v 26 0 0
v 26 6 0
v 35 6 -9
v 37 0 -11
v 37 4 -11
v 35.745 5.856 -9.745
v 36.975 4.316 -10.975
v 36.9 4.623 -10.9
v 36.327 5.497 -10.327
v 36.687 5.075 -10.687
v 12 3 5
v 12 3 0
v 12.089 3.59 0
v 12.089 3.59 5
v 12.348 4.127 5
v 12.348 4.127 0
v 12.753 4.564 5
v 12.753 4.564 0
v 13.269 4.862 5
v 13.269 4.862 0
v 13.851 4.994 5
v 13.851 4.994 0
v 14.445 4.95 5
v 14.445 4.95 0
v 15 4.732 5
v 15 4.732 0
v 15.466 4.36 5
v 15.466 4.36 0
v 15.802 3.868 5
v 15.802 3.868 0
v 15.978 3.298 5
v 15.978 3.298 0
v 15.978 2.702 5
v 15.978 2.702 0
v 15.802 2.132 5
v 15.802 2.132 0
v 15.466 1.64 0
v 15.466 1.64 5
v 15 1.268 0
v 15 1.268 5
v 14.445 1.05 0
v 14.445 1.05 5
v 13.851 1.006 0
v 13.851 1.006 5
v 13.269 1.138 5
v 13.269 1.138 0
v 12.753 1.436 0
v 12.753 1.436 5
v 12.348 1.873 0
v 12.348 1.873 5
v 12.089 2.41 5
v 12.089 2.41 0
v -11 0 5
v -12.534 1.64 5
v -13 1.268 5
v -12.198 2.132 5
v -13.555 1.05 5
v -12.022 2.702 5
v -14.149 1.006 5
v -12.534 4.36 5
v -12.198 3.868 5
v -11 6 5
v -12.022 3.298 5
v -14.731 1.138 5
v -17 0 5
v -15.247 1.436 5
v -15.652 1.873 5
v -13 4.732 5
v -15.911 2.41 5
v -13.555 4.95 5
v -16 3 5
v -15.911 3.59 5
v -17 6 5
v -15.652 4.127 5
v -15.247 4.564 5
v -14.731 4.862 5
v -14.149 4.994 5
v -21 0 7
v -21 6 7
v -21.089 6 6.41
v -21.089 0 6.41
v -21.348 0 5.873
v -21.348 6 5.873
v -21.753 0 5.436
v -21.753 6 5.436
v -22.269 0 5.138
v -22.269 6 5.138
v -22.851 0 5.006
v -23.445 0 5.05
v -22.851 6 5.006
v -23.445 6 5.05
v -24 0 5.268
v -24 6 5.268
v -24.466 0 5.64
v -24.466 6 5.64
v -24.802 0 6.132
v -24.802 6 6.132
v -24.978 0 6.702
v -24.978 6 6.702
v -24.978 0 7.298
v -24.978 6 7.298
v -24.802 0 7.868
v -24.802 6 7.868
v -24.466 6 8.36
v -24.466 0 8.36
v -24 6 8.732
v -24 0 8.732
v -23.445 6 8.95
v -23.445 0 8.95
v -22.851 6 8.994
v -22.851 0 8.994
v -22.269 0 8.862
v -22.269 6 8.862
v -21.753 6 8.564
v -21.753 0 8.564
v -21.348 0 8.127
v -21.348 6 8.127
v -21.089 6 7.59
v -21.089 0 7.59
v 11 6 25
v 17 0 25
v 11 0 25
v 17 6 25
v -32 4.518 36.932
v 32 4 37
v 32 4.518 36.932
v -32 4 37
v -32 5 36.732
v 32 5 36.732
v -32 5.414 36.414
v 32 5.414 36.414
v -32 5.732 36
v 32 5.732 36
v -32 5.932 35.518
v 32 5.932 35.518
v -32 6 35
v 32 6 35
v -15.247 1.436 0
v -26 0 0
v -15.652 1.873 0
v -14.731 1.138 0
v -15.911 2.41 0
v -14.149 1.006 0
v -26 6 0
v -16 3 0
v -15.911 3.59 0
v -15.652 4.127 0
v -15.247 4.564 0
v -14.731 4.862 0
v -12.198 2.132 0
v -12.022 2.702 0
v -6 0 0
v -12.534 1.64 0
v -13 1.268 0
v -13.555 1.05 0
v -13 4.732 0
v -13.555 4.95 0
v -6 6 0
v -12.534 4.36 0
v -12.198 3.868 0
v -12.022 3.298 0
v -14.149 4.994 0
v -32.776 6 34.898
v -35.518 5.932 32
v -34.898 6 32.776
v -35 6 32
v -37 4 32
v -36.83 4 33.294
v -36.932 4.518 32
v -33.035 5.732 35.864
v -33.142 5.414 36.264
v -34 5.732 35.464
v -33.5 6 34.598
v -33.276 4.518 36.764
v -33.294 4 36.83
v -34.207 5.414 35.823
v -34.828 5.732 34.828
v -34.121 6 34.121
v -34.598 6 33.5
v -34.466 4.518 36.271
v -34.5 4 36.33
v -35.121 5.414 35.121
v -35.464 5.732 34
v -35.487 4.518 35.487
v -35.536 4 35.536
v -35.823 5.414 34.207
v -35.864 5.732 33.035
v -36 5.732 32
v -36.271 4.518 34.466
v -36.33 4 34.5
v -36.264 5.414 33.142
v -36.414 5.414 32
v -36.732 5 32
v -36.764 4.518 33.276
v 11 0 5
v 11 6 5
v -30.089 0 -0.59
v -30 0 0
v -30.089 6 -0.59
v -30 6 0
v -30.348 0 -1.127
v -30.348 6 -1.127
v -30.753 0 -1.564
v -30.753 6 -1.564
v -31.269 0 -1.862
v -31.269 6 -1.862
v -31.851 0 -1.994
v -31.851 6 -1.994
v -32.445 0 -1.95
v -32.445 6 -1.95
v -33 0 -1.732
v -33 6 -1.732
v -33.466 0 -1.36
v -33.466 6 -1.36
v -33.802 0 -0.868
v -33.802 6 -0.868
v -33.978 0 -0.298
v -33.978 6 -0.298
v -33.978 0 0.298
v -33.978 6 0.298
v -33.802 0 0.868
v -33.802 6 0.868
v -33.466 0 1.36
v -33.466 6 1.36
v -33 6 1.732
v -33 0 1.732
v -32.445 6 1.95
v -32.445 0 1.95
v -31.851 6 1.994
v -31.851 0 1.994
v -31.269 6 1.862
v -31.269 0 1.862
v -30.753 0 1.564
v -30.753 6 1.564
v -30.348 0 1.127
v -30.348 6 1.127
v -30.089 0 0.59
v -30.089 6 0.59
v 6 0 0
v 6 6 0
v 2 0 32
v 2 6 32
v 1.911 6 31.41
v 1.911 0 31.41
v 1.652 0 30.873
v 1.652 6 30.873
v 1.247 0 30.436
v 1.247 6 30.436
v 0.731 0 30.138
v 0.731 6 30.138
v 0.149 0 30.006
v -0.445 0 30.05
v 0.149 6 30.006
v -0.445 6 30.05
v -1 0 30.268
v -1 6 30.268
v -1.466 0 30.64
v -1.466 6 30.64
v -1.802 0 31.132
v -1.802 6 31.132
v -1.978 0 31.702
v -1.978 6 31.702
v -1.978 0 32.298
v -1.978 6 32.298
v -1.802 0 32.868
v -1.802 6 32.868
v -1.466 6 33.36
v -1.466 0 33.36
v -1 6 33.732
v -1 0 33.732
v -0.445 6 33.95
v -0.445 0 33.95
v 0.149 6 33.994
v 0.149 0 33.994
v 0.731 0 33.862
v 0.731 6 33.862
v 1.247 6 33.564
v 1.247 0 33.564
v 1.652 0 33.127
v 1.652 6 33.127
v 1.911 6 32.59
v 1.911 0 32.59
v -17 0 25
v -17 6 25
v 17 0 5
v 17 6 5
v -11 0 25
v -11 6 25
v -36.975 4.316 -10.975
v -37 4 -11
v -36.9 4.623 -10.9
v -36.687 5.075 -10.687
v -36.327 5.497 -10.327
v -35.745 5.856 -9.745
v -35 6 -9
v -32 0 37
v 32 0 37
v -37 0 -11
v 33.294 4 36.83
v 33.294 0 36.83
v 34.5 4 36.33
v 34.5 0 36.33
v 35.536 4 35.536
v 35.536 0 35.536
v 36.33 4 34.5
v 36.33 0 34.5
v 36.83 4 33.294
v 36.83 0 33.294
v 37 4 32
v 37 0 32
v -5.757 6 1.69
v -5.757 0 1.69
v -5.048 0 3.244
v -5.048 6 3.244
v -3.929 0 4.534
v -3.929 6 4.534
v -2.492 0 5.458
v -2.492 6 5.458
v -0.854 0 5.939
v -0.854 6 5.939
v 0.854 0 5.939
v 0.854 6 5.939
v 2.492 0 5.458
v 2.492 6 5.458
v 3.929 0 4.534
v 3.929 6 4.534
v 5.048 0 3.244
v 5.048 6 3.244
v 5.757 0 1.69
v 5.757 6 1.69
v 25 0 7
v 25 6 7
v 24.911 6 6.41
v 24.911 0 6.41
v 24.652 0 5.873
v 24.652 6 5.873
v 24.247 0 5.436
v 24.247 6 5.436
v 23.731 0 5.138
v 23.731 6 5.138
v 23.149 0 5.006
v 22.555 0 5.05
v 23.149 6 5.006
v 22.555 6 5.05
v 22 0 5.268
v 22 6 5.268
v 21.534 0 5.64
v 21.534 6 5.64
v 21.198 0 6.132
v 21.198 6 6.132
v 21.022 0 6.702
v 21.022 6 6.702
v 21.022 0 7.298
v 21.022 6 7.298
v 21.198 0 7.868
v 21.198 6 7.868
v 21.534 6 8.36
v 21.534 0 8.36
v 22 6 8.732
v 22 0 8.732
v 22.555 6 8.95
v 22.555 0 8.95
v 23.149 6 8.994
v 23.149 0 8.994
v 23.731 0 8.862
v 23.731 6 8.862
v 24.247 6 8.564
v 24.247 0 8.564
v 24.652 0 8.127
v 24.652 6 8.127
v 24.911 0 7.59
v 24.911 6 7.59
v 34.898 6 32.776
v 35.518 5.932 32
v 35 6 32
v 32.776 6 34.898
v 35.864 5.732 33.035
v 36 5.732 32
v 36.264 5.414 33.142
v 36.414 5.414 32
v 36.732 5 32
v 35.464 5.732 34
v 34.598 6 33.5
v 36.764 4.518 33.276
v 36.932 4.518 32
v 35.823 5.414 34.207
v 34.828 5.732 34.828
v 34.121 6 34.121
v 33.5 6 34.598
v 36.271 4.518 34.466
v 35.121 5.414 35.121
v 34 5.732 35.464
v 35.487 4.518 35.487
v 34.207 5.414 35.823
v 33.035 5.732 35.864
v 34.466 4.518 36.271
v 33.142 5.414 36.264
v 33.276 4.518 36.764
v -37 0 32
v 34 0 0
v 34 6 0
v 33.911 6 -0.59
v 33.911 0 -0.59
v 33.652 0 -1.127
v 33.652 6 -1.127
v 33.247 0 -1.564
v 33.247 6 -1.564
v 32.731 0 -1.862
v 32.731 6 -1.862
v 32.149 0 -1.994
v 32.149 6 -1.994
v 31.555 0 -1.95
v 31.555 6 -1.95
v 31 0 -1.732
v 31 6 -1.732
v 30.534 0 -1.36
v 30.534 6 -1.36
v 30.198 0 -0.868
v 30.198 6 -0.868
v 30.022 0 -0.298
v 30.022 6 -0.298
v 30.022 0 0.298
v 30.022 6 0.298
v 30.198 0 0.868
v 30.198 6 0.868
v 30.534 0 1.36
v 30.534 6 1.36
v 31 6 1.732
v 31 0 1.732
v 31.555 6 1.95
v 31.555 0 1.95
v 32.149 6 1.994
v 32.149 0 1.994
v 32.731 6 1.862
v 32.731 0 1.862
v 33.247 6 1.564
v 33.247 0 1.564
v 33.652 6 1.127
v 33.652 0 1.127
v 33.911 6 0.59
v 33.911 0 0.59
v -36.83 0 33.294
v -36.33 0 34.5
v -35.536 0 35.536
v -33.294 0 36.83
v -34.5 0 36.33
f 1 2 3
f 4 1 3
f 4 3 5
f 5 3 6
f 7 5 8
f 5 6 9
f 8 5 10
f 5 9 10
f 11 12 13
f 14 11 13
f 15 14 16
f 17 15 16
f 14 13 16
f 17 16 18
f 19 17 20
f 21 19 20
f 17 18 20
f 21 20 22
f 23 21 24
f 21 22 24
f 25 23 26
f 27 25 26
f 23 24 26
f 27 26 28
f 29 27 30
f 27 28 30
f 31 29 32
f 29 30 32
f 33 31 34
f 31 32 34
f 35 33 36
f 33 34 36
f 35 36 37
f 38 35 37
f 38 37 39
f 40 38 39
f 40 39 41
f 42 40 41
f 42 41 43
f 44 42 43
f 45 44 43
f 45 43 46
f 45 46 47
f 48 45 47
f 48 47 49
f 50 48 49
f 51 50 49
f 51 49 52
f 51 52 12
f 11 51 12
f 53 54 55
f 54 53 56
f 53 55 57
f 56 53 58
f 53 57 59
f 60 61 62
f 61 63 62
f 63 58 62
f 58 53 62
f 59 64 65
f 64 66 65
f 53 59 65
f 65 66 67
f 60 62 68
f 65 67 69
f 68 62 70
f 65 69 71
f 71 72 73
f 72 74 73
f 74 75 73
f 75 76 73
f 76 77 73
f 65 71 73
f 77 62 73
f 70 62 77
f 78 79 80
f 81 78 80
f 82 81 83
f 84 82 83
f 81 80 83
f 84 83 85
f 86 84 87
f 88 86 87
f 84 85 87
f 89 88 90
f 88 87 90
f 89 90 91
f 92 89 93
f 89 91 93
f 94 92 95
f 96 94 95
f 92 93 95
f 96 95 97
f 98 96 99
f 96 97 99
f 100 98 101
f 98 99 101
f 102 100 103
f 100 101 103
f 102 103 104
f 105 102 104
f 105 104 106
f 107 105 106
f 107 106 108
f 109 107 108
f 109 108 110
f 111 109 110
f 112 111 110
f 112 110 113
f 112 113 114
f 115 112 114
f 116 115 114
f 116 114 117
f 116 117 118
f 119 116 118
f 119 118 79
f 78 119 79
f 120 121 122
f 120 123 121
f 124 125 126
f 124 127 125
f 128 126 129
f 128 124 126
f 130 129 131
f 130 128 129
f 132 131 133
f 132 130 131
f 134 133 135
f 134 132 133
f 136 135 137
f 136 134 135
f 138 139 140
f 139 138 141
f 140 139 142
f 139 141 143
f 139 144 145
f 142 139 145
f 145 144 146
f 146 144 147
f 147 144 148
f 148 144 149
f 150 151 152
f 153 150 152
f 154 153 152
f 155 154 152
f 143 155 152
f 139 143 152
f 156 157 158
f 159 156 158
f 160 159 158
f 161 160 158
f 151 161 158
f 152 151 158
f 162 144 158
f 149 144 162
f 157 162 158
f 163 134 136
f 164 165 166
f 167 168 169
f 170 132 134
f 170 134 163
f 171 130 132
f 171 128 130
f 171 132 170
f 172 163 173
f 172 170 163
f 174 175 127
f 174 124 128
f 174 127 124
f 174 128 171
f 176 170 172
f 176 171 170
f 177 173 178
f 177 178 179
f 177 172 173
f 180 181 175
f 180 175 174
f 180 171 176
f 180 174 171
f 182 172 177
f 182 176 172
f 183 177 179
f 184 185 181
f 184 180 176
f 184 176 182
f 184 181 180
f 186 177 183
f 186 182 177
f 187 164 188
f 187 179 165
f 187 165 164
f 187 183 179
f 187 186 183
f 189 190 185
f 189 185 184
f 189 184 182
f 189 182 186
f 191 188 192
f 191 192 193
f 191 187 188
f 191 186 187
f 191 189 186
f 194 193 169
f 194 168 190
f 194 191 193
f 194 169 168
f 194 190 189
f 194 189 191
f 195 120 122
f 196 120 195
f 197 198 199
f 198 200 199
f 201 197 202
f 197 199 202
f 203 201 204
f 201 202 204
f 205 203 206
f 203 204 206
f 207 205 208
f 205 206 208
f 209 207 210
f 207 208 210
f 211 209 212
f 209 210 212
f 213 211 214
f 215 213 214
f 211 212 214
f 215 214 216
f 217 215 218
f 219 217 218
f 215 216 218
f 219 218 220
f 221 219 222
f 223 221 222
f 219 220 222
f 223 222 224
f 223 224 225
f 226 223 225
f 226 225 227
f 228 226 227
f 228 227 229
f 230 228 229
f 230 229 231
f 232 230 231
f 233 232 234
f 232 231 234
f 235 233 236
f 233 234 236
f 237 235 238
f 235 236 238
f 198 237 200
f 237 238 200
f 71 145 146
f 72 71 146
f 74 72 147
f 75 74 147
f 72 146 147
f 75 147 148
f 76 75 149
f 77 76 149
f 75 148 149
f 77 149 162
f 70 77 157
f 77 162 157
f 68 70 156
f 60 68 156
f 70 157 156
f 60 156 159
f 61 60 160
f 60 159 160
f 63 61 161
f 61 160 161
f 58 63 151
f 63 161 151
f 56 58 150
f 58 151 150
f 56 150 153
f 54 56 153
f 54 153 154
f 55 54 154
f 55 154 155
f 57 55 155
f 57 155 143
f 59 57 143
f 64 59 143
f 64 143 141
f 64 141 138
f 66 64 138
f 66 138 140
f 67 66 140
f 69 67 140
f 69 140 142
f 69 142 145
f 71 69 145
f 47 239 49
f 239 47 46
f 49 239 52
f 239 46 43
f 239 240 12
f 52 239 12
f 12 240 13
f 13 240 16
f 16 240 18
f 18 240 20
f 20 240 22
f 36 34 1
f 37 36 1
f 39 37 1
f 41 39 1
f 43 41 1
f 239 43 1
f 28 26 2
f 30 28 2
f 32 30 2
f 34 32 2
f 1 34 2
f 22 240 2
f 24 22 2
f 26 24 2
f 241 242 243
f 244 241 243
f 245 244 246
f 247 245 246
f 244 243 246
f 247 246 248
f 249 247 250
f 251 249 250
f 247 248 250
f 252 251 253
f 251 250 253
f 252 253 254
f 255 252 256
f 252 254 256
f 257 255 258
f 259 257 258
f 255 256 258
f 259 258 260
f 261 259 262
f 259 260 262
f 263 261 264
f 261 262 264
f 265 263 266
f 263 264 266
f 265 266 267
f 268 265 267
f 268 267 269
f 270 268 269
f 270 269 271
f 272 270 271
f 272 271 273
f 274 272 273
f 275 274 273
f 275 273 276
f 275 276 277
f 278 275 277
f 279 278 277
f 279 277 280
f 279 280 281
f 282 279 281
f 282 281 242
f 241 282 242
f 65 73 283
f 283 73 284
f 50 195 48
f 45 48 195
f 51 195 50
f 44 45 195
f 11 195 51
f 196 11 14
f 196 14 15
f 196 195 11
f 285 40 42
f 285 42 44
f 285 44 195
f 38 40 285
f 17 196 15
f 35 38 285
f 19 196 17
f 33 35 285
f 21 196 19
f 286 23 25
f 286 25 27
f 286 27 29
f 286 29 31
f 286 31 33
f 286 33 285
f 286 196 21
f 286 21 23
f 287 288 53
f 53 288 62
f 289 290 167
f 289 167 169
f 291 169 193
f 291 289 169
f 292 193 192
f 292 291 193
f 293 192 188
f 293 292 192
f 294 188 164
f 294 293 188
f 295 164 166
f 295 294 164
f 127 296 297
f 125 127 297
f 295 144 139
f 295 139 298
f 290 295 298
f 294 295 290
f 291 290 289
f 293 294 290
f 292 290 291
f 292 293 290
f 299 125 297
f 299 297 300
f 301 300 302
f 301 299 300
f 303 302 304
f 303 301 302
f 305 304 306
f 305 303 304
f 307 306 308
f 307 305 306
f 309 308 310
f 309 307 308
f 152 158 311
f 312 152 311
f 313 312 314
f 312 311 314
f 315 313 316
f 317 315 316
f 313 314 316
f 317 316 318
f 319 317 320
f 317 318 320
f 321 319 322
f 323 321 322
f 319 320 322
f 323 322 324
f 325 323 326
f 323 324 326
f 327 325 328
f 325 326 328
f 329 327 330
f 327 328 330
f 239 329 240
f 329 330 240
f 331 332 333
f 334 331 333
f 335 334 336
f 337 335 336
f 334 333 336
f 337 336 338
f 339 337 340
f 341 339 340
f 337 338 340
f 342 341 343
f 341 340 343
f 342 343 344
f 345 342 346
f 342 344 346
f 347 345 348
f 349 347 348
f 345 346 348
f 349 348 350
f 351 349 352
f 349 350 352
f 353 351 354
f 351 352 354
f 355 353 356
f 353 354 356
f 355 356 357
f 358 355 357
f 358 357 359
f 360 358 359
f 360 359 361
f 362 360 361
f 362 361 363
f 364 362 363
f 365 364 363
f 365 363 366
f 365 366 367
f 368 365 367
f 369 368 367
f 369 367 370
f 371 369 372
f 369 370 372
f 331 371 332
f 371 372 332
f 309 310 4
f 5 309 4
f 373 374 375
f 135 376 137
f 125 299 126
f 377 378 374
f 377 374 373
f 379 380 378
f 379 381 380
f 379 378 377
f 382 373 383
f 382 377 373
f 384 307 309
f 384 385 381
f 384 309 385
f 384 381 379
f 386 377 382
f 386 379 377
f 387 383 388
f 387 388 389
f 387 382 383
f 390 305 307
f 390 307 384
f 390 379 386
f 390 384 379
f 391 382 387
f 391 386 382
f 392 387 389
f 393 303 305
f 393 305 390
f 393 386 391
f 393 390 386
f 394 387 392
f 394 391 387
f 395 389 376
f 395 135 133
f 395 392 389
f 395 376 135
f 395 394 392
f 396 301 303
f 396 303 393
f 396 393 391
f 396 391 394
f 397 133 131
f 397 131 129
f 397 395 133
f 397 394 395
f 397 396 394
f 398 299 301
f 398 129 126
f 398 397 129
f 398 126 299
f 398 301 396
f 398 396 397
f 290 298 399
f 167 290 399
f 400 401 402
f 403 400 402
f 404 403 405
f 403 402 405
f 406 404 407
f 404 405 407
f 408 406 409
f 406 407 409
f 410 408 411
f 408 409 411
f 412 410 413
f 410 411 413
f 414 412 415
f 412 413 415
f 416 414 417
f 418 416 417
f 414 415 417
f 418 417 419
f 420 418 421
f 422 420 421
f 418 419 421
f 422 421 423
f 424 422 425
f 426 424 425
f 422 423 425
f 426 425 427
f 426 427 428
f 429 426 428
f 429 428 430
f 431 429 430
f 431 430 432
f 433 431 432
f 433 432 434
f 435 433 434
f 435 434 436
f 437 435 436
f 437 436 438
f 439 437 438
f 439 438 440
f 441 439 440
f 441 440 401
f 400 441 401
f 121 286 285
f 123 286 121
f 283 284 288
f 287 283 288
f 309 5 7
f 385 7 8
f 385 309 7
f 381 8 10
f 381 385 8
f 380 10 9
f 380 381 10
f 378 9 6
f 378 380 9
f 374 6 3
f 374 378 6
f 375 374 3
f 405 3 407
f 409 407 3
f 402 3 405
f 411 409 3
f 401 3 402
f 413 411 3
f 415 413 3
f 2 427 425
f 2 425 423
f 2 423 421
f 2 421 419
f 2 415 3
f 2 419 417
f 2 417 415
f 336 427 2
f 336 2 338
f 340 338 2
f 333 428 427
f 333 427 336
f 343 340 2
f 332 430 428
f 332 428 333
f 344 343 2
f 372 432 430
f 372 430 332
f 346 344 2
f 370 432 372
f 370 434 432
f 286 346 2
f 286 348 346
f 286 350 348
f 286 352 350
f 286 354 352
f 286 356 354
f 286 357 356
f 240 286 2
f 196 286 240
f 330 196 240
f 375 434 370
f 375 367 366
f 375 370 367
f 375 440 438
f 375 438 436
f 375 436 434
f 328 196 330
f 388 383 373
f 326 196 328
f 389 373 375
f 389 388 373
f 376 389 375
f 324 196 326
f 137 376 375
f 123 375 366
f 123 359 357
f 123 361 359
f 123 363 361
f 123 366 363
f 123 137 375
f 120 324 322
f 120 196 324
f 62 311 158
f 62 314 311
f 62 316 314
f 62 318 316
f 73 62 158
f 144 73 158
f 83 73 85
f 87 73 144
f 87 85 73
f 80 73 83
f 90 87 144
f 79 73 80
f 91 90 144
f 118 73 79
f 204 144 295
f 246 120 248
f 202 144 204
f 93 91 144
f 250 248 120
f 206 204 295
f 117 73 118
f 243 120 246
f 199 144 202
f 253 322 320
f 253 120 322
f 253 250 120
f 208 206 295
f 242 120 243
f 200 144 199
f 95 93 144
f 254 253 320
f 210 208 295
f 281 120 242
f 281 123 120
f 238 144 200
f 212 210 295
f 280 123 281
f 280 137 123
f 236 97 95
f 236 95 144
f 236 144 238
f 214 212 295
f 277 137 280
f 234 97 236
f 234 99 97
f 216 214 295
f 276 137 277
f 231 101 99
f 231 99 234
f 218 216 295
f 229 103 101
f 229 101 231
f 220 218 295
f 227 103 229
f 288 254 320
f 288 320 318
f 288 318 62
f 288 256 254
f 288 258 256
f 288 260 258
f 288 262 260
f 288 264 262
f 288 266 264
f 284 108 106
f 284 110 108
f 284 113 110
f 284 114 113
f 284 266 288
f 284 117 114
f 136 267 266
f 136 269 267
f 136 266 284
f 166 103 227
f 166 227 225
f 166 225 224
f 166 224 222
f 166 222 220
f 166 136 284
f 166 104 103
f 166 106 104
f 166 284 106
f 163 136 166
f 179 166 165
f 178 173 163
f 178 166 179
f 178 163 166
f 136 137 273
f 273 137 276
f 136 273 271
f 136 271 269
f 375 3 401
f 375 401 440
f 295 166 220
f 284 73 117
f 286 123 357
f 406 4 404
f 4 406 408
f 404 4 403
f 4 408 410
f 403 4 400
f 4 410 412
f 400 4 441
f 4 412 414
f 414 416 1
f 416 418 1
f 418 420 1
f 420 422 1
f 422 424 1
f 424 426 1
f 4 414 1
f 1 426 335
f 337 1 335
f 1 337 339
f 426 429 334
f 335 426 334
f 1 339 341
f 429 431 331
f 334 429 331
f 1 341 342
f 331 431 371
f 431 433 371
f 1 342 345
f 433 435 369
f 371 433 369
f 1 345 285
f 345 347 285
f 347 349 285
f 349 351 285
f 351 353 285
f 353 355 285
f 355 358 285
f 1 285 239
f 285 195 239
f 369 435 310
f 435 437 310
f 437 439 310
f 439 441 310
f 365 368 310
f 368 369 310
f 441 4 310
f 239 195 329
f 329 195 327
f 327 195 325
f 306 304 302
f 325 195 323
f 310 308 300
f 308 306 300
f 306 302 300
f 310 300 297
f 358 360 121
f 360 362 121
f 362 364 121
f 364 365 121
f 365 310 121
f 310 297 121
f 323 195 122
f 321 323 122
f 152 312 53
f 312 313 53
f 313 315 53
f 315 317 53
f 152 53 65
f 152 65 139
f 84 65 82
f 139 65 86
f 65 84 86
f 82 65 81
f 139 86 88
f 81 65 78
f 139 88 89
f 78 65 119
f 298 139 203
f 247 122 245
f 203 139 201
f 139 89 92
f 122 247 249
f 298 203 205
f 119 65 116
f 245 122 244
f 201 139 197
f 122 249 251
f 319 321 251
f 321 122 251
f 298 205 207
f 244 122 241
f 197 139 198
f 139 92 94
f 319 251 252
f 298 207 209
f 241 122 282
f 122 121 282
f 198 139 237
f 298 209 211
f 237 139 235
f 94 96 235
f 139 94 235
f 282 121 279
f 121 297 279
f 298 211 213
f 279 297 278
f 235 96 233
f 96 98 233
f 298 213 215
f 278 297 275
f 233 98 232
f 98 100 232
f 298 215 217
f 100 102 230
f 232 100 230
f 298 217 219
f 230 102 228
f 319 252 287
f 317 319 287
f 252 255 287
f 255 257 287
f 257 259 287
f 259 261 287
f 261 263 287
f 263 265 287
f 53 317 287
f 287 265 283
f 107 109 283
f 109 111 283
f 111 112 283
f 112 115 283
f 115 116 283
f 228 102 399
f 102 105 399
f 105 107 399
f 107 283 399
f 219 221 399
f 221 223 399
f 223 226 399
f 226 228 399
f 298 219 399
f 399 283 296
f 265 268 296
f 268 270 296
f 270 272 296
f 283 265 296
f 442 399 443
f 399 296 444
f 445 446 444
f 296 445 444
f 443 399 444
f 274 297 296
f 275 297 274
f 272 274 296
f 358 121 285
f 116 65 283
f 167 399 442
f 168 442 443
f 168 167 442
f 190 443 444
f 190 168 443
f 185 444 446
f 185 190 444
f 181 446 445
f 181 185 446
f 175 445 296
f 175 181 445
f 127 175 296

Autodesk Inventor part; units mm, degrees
ref_plane "YZ Plane" through (0, 0, 0) normal (1, 0, 0) x (0, 1, 0)
ref_plane "XZ Plane" through (0, 0, 0) normal (0, 1, 0) x (-1, 0, 0)
ref_plane "XY Plane" through (0, 0, 0) normal (0, 0, 1) x (1, 0, 0)
sketch "Sketch1" plane through (0, 0, 0) normal (0, 1, 0) x (-1, 0, 0)
  line L0 (37, 37) -> (-37, 37)
  line L1 (-37, 37) -> (-37, -37)
  line L2 (-37, -37) -> (37, -37)
  line L3 (37, -37) -> (37, 37)
  point P0 (0, 0)
  dimension "d0" = 74
  dimension "d1" = 74
extrude "Extrusion1" add sketch "Sketch1" along normal blind 6
fillet "Fillet1" radius 5 4 edges at (-37, 3, 37) (37, 3, 37) (37, 3, -37) (-37, 3, -37)
sketch "Sketch2" plane through (0, 6, 0) normal (0, 1, 0) x (1, 0, 0)
  line L0 (-37, 32) -> (-37, -32) projected
  line L1 (-37, 0) -> (37, 0)
  line L2 (37, -32) -> (37, 32) projected
  circle A0 centre (0, 0) radius 6
  line L3 (-37, 0) -> (37, 0)
  line L4 (37, 0) -> (37, 63.5)
  line L5 (37, 63.5) -> (-37, 63.5)
  line L6 (-37, 63.5) -> (-37, 0)
  line L7 (-6, 0) -> (-26, 0)
  line L8 (-26, 0) -> (-37, 11)
  line L9 (6, 0) -> (26, 0)
  line L10 (26, 0) -> (37, 11)
  circle A1 centre (32, 0) radius 2
  circle A2 centre (0, -32) radius 2
  circle A3 centre (-32, 0) radius 2
  point P0 (-6, 0)
  dimension "d5" = 12
  dimension "d6" = 20
  dimension "d7" = 135
  dimension "d8" = 20
  dimension "d9" = 135
  dimension "d10" = 4
  dimension "d11" = 4
  dimension "d12" = 4
extrude "Extrusion2" cut sketch "Sketch2" against normal blind 10 contours L6 L5 L4 L2 L10 L1 A0 L8 L0 | A3 L1 | L1 A3 | A0 L1 | L1 A0 | A1 L1 | L1 A1 | A2
sketch "Sketch3" plane through (0, 6, 0) normal (0, 1, 0) x (1, 0, 0)
  line L0 (11, -5) -> (17, -5)
  line L1 (17, -5) -> (17, -25)
  line L2 (17, -25) -> (11, -25)
  line L3 (11, -25) -> (11, -5)
  line L4 (-11, -5) -> (-17, -5)
  line L5 (-17, -5) -> (-17, -25)
  line L6 (-17, -25) -> (-11, -25)
  line L7 (-11, -25) -> (-11, -5)
  point P0 (0, 0)
  dimension "d15" = 6
  dimension "d16" = 20
  dimension "d17" = 6
extrude "Extrusion3" cut sketch "Sketch3" against normal blind 10
sketch "Sketch4" plane through (26, 6, 0) normal (0, 0, -1) x (-1, 0, 0)
  circle A0 centre (12, -3) radius 2
  circle A1 centre (40, -3) radius 2
  point P0 (26, -6)
  dimension "d20" = 4
  dimension "d21" = 4
extrude "Extrusion4" cut sketch "Sketch4" against normal blind 10
fillet "Fillet2" radius 2 5 edges at (35.5355, 6, 35.5355) (0, 6, 37) (-35.5355, 6, 35.5355) (-37, 6, 10.5) (37, 6, 10.5)
sketch "Sketch5" plane through (0, 6, 0) normal (0, 1, 0) x (1, 0, 0)
  circle A0 centre (23, -7) radius 2
  circle A1 centre (-23, -7) radius 2
  point P0 (0, 0)
  dimension "d25" = 4
  dimension "d26" = 4
extrude "Extrusion5" cut sketch "Sketch5" against normal blind 10
properties part number "g2HEMount1"
